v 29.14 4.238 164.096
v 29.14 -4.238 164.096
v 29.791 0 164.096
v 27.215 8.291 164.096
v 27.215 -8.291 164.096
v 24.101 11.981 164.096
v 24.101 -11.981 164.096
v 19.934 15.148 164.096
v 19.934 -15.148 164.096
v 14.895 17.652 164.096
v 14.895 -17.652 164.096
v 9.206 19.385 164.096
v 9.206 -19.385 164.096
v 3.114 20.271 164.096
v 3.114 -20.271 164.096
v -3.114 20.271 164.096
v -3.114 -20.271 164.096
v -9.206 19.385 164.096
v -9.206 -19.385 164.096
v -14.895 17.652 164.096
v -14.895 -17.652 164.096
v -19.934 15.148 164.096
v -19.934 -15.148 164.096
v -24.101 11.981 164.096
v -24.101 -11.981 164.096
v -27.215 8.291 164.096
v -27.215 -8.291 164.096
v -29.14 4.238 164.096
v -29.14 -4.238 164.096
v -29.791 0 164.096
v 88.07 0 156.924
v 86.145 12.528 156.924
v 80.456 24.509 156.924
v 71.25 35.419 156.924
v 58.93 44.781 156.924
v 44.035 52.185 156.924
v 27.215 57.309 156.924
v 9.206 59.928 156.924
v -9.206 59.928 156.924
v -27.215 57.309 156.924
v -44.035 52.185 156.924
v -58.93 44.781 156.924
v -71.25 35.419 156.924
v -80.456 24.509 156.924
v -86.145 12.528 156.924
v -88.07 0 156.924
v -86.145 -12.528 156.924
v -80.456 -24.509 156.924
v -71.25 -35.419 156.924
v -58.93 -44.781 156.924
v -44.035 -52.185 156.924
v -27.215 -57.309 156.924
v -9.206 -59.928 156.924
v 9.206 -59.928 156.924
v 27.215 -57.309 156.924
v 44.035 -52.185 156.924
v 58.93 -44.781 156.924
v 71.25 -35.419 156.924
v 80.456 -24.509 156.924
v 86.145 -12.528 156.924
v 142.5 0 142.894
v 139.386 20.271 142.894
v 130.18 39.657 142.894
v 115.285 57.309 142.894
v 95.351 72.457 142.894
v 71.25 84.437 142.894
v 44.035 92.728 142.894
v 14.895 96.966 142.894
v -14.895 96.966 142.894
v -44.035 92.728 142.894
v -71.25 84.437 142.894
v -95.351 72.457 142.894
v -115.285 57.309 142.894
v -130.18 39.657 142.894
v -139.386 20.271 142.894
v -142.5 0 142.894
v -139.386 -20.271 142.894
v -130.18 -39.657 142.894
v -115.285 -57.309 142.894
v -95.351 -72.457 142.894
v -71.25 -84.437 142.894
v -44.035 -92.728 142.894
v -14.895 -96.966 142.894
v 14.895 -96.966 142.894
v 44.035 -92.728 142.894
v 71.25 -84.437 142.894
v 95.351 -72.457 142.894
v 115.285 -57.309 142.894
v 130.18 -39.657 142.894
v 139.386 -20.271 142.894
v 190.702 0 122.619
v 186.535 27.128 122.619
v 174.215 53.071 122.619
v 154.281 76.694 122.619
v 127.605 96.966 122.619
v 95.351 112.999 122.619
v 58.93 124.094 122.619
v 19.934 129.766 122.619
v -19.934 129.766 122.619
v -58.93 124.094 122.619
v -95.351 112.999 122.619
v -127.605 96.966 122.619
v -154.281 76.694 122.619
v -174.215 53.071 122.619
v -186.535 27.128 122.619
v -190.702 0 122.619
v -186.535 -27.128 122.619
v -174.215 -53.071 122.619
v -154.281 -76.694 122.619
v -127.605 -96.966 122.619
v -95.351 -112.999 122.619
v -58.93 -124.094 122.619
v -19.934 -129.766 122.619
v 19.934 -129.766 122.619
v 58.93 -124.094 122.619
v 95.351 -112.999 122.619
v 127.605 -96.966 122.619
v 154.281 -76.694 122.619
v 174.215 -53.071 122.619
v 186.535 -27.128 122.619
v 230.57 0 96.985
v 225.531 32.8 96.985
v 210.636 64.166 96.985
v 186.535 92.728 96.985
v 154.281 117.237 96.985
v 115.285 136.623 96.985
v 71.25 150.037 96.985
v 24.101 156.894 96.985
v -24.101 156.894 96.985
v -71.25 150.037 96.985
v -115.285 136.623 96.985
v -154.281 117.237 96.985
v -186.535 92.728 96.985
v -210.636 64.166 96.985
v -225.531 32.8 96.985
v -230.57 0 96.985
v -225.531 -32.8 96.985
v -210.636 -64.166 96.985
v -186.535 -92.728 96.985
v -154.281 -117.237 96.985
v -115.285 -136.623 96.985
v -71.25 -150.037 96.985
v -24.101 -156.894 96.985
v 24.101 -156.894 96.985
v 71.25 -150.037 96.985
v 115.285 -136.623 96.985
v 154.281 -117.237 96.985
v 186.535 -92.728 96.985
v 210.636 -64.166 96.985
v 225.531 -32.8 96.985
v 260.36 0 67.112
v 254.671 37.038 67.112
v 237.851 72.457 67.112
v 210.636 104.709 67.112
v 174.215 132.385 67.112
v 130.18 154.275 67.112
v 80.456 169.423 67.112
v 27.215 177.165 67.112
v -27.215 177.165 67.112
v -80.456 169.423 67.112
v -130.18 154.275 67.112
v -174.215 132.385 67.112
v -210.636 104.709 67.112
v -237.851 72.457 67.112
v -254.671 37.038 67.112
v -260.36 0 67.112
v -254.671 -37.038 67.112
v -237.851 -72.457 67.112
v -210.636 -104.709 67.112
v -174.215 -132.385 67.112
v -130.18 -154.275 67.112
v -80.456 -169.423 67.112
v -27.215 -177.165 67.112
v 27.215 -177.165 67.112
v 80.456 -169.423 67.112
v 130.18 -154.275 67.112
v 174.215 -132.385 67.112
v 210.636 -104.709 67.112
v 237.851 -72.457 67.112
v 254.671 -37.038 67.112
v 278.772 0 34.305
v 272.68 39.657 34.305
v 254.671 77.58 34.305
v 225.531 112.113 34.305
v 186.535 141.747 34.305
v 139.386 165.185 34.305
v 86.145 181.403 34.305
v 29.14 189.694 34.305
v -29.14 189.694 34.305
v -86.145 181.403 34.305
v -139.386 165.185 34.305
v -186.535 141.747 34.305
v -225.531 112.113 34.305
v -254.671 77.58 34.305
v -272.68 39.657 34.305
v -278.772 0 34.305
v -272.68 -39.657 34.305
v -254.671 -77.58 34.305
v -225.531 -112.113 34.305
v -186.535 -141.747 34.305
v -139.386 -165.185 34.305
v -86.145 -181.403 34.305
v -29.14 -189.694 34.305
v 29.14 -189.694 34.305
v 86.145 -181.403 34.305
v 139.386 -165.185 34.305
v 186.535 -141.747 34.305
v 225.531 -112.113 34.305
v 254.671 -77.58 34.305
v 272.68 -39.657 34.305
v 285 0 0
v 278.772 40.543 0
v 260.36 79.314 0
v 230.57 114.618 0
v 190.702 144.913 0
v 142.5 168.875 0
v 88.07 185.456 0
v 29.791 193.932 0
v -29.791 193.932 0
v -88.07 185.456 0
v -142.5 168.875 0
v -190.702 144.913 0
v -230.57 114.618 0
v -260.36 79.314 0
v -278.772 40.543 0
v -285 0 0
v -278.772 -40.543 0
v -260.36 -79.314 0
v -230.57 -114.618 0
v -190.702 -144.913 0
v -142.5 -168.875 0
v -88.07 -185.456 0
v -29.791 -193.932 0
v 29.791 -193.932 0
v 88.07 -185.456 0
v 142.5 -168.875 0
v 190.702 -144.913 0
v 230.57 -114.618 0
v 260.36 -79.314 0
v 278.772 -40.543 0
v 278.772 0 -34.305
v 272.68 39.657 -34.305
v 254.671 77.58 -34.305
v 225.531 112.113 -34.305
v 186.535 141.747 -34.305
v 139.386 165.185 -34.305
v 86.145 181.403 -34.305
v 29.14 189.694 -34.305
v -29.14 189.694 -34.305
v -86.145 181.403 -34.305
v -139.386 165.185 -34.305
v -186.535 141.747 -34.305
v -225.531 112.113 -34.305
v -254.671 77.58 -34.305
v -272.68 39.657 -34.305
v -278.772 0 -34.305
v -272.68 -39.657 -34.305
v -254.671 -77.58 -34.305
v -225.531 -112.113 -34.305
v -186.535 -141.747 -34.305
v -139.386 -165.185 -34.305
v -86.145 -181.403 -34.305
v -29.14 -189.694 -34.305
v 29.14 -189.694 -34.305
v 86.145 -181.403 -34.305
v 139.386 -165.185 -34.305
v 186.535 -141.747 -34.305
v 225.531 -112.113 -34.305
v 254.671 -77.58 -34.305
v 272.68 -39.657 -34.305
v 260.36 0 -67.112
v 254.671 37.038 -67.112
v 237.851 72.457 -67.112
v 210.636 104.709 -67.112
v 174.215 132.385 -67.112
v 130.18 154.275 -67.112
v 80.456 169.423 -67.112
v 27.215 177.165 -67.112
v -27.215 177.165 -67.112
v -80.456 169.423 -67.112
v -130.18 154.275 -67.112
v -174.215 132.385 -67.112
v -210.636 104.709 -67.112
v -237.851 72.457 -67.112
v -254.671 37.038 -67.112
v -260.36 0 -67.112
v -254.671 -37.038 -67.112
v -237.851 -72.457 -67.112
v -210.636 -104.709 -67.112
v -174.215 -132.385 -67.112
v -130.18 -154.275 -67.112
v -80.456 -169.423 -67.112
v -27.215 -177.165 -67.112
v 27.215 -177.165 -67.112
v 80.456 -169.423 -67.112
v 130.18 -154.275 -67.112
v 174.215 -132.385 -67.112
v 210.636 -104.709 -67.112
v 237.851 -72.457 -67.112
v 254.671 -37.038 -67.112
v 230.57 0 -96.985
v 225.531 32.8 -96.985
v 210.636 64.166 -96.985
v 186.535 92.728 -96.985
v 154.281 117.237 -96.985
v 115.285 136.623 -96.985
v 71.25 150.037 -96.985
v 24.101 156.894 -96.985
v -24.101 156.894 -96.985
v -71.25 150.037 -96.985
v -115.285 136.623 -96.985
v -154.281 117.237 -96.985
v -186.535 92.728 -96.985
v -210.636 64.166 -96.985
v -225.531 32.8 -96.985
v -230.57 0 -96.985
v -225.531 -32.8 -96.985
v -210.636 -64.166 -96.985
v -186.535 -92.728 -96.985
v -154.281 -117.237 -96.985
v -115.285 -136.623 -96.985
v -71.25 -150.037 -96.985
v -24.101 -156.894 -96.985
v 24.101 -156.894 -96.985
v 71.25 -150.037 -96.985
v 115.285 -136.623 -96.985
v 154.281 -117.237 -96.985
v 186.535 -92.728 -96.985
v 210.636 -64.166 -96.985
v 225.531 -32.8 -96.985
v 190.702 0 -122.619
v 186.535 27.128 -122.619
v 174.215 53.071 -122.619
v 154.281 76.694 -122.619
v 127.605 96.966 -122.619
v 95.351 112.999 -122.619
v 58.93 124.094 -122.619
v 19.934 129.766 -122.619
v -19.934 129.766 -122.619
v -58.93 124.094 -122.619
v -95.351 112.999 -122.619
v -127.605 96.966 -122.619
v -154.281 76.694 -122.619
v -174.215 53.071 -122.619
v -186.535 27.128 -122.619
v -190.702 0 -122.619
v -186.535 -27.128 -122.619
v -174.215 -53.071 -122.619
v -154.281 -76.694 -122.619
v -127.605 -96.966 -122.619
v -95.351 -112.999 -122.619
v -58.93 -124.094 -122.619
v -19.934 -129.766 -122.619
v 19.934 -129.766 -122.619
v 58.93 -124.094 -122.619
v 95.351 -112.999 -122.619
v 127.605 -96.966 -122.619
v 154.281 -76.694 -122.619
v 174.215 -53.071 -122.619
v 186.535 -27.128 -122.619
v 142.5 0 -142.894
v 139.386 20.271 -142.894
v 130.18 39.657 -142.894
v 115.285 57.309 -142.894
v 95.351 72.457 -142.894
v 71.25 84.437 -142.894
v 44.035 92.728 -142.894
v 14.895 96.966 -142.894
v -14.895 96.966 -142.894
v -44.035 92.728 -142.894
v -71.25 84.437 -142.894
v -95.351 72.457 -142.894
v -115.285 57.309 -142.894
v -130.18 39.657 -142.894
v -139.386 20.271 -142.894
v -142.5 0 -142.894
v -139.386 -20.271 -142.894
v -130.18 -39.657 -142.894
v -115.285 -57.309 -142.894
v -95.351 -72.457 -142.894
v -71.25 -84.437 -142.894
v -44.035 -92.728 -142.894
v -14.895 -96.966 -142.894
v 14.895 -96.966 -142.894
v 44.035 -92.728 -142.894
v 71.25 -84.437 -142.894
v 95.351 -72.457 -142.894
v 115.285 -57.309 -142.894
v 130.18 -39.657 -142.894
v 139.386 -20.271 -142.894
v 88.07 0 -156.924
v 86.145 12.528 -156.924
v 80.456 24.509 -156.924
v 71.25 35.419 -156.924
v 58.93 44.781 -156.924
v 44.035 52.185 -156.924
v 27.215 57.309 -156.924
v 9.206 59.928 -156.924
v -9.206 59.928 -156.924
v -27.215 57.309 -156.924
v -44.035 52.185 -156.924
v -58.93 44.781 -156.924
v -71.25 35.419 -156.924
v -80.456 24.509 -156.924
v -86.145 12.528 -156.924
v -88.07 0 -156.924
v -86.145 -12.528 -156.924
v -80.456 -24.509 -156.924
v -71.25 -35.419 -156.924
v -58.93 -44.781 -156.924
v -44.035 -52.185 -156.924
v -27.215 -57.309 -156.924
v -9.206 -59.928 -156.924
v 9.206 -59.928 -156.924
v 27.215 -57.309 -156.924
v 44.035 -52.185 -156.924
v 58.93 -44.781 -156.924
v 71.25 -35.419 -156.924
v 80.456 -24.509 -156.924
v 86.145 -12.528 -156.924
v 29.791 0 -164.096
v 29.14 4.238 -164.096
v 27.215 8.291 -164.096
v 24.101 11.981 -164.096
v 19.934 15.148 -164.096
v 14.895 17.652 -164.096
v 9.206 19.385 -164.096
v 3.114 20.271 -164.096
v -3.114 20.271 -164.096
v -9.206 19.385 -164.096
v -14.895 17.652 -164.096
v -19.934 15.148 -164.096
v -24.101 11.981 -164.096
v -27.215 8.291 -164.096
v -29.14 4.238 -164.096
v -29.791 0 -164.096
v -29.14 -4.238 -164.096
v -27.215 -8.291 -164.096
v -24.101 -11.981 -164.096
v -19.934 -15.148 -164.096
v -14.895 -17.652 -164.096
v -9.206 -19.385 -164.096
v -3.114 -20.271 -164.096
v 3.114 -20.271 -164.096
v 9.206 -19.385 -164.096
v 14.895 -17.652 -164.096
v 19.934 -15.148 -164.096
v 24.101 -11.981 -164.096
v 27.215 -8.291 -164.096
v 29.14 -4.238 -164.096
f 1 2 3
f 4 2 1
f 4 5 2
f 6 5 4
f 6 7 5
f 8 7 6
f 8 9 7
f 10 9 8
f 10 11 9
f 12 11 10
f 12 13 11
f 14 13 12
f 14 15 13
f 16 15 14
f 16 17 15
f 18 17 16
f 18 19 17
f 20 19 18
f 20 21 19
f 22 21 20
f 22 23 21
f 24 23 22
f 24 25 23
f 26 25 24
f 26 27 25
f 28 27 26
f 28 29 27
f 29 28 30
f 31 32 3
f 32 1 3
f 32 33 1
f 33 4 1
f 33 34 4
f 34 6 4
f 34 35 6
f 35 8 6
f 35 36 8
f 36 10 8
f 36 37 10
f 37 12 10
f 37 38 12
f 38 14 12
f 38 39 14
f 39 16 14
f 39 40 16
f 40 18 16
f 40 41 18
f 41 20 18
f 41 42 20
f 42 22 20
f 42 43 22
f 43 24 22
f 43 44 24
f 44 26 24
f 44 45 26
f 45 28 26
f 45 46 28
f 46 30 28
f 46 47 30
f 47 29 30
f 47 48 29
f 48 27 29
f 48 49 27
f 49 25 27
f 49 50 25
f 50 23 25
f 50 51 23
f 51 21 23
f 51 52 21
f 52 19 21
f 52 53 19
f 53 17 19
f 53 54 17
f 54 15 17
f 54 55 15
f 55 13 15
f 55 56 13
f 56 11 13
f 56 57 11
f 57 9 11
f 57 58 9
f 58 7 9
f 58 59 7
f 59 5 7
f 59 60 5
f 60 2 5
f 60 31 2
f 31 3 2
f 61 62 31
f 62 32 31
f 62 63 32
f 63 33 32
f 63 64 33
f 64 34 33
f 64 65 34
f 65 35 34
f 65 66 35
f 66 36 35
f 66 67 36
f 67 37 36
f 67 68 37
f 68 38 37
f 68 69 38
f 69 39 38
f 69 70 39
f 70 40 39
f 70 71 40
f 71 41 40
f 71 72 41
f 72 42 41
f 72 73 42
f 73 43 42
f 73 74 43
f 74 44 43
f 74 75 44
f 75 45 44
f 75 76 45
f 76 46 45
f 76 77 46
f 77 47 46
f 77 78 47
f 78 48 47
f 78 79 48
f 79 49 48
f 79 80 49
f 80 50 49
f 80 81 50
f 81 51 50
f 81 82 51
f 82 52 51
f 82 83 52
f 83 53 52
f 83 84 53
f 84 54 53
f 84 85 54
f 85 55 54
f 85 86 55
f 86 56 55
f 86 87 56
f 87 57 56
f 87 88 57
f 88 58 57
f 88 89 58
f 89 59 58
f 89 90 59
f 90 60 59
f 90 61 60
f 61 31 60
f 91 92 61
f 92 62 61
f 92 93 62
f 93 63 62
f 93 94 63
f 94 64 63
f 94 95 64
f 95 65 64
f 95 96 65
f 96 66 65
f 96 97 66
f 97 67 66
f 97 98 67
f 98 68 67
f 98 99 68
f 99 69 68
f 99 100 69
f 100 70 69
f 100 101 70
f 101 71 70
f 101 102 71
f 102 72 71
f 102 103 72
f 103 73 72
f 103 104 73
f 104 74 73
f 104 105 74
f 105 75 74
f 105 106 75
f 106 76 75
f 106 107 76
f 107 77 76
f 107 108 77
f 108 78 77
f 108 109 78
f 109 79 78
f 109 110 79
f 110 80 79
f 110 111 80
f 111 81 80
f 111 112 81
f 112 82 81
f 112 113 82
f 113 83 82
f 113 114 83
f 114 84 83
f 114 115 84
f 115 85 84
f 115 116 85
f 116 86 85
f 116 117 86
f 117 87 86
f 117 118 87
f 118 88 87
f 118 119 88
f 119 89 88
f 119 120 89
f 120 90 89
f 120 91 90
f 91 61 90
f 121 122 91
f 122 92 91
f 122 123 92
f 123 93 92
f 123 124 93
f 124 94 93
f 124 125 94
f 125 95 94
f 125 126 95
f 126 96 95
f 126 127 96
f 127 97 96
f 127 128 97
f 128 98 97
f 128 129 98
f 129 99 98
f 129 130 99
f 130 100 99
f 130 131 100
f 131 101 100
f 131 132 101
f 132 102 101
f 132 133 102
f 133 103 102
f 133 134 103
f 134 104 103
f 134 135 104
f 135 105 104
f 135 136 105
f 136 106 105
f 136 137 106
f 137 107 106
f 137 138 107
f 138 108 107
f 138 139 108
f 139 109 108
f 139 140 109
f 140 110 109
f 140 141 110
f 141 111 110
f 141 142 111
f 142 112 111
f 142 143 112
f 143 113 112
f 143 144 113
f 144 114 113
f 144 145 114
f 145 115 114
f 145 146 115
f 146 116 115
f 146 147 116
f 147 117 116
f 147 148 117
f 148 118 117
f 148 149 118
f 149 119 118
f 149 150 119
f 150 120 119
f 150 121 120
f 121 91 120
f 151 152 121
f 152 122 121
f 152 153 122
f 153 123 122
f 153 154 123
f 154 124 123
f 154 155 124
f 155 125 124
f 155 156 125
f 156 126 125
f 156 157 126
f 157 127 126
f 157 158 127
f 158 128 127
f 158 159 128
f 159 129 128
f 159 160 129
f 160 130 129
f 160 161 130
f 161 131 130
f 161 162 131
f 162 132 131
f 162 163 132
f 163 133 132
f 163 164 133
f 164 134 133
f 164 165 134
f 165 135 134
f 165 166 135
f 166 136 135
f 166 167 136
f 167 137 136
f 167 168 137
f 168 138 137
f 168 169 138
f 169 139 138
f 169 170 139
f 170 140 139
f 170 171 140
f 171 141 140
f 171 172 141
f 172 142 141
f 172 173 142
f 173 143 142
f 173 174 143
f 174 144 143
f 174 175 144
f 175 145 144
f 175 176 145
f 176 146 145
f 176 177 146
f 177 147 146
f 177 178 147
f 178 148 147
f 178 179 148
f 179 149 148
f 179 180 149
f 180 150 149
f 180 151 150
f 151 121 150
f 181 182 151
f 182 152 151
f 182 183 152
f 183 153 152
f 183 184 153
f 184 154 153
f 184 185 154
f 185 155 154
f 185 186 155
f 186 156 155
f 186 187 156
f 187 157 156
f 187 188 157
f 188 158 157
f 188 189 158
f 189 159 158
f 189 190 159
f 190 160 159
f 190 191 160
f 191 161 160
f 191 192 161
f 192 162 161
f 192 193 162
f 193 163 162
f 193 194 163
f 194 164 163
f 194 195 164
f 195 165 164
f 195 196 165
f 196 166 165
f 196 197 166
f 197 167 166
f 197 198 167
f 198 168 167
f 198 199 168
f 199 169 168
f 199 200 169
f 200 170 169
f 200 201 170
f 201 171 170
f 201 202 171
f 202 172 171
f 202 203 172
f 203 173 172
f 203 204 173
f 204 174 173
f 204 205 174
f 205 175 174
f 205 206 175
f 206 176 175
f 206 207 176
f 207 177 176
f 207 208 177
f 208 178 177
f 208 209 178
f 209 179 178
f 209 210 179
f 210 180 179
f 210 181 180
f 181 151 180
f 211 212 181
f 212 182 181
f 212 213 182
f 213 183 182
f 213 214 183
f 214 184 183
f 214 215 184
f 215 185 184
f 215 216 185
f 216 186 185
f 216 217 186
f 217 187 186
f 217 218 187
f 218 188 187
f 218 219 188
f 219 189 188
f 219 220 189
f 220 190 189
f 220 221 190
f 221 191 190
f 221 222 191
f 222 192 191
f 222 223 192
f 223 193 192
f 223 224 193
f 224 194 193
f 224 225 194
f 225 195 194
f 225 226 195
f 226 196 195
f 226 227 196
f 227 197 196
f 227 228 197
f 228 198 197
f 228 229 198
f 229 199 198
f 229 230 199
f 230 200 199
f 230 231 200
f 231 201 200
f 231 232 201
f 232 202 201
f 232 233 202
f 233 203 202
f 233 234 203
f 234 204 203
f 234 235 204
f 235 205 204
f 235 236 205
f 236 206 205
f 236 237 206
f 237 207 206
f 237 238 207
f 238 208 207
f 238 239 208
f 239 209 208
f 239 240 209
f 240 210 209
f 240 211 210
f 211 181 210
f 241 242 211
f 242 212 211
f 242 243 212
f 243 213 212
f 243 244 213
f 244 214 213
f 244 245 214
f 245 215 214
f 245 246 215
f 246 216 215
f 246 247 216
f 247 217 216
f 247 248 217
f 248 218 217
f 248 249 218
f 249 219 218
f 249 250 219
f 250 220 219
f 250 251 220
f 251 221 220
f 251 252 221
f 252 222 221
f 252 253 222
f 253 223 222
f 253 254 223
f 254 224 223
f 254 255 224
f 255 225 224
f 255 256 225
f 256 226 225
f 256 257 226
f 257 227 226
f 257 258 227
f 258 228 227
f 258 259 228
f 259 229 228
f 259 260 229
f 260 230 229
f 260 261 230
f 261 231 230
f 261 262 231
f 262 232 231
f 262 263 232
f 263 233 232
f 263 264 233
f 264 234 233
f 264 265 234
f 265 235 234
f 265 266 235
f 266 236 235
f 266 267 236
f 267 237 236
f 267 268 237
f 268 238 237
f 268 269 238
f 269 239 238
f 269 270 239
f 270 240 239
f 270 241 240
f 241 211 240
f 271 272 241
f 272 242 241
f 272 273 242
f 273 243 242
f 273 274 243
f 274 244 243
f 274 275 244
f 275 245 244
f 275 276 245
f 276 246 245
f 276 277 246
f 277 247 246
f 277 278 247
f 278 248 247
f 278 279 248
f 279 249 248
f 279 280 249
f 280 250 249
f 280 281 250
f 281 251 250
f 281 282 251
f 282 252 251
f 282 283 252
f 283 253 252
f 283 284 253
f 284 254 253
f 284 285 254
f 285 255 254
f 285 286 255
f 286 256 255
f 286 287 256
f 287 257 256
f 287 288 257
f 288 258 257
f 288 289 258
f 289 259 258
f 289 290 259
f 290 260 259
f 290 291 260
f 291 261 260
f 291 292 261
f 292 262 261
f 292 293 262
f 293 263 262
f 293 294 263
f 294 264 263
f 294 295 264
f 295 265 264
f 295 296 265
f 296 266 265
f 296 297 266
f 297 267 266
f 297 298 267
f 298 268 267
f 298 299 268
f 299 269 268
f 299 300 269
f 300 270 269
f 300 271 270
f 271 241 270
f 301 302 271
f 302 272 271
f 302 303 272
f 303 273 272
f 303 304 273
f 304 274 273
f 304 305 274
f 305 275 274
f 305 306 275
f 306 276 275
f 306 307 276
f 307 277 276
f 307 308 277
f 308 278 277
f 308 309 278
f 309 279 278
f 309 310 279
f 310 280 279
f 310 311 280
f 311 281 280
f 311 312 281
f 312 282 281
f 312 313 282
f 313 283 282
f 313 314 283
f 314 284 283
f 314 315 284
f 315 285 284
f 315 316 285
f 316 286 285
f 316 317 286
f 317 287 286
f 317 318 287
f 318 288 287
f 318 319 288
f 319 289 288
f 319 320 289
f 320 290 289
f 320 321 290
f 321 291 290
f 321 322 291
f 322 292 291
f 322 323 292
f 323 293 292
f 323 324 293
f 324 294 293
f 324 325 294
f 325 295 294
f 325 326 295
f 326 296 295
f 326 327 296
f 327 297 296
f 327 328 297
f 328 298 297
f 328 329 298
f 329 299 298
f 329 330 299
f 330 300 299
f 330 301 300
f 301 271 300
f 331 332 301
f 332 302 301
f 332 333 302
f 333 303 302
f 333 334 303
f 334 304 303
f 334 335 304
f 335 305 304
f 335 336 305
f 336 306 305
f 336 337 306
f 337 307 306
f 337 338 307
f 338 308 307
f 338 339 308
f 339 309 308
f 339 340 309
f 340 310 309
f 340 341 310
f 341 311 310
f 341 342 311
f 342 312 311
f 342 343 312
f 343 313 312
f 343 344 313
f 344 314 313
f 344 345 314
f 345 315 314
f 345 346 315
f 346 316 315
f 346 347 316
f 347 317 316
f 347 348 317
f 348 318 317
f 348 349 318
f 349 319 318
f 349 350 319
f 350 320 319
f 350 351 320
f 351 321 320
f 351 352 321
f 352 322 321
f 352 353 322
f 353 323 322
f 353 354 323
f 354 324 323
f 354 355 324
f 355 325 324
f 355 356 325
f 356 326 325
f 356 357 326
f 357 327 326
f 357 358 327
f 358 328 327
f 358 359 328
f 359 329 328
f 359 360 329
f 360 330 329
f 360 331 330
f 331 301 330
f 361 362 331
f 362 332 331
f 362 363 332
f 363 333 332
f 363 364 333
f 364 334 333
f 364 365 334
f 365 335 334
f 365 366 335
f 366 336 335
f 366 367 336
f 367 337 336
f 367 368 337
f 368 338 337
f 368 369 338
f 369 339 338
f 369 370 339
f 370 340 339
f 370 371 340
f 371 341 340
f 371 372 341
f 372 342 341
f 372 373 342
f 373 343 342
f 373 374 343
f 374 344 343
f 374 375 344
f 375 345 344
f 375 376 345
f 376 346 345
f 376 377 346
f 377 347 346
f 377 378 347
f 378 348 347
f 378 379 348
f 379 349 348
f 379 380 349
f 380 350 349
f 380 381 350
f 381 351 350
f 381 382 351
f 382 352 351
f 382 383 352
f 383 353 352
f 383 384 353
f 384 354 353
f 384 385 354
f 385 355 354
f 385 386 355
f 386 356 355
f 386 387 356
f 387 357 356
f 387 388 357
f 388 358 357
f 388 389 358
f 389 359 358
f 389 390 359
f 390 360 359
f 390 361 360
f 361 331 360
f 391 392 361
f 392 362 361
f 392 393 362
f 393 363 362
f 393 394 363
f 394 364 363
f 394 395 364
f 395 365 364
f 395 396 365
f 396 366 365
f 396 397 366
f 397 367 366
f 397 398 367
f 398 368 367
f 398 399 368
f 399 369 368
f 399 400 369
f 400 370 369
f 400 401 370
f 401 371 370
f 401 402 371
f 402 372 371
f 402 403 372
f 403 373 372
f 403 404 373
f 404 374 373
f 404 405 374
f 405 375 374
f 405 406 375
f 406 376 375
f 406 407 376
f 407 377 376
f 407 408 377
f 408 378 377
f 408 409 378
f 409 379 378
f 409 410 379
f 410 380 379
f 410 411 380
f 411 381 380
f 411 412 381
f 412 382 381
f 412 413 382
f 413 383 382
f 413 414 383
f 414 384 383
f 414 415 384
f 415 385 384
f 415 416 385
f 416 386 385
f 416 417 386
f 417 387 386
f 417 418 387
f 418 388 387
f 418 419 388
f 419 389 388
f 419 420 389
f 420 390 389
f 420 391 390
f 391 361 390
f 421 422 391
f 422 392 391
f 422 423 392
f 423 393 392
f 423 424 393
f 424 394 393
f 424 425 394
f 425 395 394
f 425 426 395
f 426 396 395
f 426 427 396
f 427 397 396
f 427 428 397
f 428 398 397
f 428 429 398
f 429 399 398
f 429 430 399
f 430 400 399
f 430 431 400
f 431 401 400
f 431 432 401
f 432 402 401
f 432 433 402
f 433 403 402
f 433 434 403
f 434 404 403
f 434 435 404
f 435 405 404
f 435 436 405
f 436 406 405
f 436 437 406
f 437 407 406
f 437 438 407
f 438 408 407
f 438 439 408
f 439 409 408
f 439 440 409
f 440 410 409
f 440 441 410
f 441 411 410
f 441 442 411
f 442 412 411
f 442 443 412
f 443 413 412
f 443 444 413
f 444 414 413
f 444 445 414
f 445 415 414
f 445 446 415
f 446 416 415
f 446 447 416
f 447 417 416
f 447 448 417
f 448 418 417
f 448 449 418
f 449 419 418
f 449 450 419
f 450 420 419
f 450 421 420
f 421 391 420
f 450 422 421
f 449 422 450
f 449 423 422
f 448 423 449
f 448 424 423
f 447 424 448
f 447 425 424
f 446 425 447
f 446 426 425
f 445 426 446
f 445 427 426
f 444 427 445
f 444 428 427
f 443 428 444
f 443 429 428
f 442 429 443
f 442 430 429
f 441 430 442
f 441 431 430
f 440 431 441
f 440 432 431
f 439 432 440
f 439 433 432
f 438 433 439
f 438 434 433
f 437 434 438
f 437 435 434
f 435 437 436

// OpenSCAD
// Generated by SolidPython 1.0.1 on 2020-07-29 00:46:54


scale(v = [19, 13, 11]) {
	sphere(r = 15);
}
/***********************************************
*********      SolidPython code:      **********
************************************************
 
# import packages: SolidPython
from solid import *
from solid.utils import *
from itertools import chain, combinations, permutations


class Resize:

    def __init__(self, scad_file):
        self.scad_file = scad_file
        #self.scad_file = import_scad(scad_file)
        # cone/cylinder param:
        self.r1 = 0
        self.r2 = 0
        self.h = 0
        # rectangular prism param:
        self.w = 0
        self.l = 0
        # ellipse param:
        self.r = 0

    # import OpenScad code (file name corresponds to shape)


    # classify shape + parameters
    def assign(self, param1, param2, param3):
        if self.scad_file == 'cone.scad':
            self.r1 = param1
            self.r2 = param2
            self.h = param3
        elif self.scad_file == 'cylinder.scad':
            self.r1 = param1
            self.r2 = param2
            self.h = param3
        elif self.scad_file == 'rectangularPrism.scad':
            self.h = param1
            self.l = param2
            self.w = param3
        else:
            self.r = param1
            self.h = param2

    # resize parameters
    def iterate(self):
        x = range(3, 20, 2)
        i = 1
        if self.scad_file == 'cone.scad':
            tempList = list(permutations(x, 2))
            for temp in tempList:
                param1 = temp[0]
                param2 = temp[1]
                filepath = 'produced_scad_files/' + 'cone' + str(param1) + '_' + str(param2) + '_' + '.scad'
                scad_render_to_file(cylinder(h=param1, r1=param2, r2=0), filepath)

        elif self.scad_file == 'cylinder.scad':
            tempList = list(permutations(x, 3))
            for temp in tempList:
                param1 = temp[0]
                param2 = temp[1]
                filepath = 'produced_scad_files/' + 'cylinder' + str(param1) + '_' + str(param2) + '_' + '.scad'
                scad_render_to_file(cylinder(h=param1, r1=param2, r2=param2), filepath)

        elif self.scad_file == 'rectangularPrism.scad':
            tempList = list(permutations(x, 3))
            for temp in tempList:
                param1 = temp[0]
                param2 = temp[1]
                param3 = temp[2]
                filepath = 'produced_scad_files/' + 'rectangularPrism' + str(param1) + '_' + str(param2) + '_' + str(
                    param3) + '.scad'
                scad_render_to_file(cube(size=(param1, param2, param3)), filepath)

        elif self.scad_file == 'ellipse.scad':
            tempList = list(permutations(x, 4))
            for temp in tempList:
                param1 = temp[0]
                param2 = temp[1]
                param3 = temp[2]
                param4 = temp[3]
                filepath = 'produced_scad_files/' + 'ellipse' + str(param1) + '_' + str(param2) + '_' + str(param3) + '_' + str(param4) + '.scad'
                scad_render_to_file(scale([param1, param2, param3])(sphere(r=param4)), filepath)

    def render_to_scadfile(self):
        scad_render_to_file(scad, 'example.scad') 
 
************************************************/
